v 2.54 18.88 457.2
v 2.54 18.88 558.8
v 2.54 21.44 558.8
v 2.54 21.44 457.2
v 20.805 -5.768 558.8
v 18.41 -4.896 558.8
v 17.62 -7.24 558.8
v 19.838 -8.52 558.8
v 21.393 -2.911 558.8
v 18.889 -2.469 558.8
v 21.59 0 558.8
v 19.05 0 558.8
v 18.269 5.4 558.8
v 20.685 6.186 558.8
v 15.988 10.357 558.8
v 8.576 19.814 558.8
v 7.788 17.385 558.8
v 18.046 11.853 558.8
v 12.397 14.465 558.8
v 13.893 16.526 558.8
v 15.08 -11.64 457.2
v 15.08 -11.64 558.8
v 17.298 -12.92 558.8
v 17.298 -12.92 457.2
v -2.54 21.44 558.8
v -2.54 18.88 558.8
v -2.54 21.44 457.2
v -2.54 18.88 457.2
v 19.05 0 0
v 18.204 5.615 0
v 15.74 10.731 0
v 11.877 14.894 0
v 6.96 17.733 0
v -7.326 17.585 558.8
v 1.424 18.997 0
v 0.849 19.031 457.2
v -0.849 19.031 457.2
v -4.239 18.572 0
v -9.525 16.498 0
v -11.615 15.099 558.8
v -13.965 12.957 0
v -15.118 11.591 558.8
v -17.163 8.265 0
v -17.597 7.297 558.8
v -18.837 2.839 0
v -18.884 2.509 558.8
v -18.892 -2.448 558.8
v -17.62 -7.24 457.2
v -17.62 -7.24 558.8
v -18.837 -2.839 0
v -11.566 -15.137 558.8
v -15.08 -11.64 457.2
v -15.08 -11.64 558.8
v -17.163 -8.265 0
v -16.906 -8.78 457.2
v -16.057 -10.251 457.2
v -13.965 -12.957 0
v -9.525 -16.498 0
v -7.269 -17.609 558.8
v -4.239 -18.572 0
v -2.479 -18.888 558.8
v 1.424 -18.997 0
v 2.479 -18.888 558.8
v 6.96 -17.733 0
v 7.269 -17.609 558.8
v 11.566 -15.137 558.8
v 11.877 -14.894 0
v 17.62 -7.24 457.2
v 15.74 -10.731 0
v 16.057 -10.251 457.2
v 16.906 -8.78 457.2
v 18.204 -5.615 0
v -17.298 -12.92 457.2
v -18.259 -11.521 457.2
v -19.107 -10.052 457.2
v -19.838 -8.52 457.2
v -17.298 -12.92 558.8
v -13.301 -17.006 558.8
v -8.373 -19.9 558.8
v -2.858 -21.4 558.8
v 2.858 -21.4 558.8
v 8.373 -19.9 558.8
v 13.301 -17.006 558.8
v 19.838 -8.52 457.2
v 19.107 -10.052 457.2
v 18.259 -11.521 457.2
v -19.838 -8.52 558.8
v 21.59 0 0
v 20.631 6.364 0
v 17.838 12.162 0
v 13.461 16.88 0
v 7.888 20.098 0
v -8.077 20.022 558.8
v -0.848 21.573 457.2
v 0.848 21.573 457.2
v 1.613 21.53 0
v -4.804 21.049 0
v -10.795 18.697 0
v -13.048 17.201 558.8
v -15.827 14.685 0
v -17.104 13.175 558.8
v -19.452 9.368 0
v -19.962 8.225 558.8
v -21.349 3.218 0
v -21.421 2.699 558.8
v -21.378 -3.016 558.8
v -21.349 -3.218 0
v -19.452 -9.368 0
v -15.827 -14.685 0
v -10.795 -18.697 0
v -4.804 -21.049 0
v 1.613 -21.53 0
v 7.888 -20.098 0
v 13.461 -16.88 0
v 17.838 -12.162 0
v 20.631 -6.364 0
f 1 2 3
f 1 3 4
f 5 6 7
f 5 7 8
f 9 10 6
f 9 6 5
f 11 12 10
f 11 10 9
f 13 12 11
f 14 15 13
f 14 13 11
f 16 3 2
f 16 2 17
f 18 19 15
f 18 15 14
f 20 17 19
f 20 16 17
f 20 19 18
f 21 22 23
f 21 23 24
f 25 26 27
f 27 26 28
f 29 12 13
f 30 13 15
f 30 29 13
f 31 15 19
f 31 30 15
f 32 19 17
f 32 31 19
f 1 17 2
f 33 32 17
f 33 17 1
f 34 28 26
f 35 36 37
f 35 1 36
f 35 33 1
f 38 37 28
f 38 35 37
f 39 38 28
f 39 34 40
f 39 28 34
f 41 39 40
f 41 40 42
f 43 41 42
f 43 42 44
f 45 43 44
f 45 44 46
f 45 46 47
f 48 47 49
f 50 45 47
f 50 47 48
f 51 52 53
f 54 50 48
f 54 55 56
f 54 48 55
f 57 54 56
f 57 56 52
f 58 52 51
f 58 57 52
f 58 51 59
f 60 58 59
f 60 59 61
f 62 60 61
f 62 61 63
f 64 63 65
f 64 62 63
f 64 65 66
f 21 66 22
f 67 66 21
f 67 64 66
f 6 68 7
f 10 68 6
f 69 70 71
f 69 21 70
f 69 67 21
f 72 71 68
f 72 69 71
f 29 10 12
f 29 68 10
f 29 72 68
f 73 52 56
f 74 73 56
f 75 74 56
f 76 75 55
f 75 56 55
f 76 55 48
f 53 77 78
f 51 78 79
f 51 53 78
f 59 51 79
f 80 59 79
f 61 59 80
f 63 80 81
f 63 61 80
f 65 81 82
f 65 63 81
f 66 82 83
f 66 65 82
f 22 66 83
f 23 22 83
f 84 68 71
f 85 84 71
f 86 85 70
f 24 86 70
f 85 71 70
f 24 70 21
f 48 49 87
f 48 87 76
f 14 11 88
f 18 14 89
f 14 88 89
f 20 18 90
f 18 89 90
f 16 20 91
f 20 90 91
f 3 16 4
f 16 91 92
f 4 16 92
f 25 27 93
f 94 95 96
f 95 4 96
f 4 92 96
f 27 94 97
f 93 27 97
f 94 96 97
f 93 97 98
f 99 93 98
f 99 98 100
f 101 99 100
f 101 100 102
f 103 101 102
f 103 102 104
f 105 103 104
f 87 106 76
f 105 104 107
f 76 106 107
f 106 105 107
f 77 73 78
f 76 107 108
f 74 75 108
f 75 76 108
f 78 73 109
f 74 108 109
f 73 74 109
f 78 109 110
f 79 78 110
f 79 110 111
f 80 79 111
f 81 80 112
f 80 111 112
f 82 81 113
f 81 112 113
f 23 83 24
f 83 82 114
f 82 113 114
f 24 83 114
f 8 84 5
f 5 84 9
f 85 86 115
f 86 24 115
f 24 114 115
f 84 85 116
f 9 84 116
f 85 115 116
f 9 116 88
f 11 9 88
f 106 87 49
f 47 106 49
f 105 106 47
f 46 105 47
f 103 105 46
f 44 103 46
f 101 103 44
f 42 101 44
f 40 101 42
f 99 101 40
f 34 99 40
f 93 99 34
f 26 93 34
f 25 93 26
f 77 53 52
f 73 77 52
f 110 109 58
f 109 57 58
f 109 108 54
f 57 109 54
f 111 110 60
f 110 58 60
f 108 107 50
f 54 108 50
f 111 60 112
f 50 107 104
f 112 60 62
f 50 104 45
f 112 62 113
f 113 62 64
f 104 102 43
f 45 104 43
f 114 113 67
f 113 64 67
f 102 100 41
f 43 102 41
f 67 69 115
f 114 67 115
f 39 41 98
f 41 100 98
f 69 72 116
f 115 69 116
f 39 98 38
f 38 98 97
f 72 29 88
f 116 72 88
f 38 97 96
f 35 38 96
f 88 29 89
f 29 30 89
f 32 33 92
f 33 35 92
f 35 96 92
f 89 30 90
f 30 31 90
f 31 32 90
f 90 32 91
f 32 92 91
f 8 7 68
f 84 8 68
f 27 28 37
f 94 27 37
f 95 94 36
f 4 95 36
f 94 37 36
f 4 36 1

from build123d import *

# Parameters (mm, degrees)
SKETCH1_R               = 21.59
SKETCH1_R_2             = 19.05
BOSS_EXTRUDE1_DEPTH     = 558.8
CUT_EXTRUDE1_REACH      = 561.634
CUT_EXTRUDE1_END_RADIUS = 21.59
SKETCH2_W               = 5.08
SKETCH2_H               = 101.6
CIRPATTERN1_COUNT       = 3


with BuildPart() as part:
    # Sketch1 → Boss-Extrude1 (new body)
    with BuildSketch(Plane.XY):
        Circle(SKETCH1_R)
        Circle(SKETCH1_R_2, mode=Mode.SUBTRACT)
    extrude(amount=BOSS_EXTRUDE1_DEPTH)

    # Cut-Extrude1: up to this cylinder (the profile starts inside it)
    cut_extrude1_end = Plane(origin=(0, 0, 508), z_dir=(0, 0, -1)) * Cylinder(CUT_EXTRUDE1_END_RADIUS, 1167.448, mode=Mode.PRIVATE)
    # Sketch2 → Cut-Extrude1 (cut, up to the surface)
    with BuildSketch(Plane(origin=(0, 0, 0), x_dir=(1, 0, 0), z_dir=(0, 1, 0)), mode=Mode.PRIVATE) as cut_extrude1_sk1:
        with Locations((0, -508)):
            Rectangle(SKETCH2_W, SKETCH2_H)
    cut_extrude1_tool1 = extrude(cut_extrude1_sk1.sketch, amount=CUT_EXTRUDE1_REACH, mode=Mode.PRIVATE) & cut_extrude1_end
    cut_extrude1 = cut_extrude1_tool1.solids().sort_by_distance((0, 0, 508))[0]
    add(cut_extrude1, mode=Mode.SUBTRACT)

    # CirPattern1: Cut-Extrude1 ×3 about axis
    cirpattern1_axis = Axis((0, 0, 0), (0, 0, 1))
    for i in range(1, CIRPATTERN1_COUNT):
        add(cut_extrude1.rotate(cirpattern1_axis, i * 360 / CIRPATTERN1_COUNT), mode=Mode.SUBTRACT)


solid = part.part
